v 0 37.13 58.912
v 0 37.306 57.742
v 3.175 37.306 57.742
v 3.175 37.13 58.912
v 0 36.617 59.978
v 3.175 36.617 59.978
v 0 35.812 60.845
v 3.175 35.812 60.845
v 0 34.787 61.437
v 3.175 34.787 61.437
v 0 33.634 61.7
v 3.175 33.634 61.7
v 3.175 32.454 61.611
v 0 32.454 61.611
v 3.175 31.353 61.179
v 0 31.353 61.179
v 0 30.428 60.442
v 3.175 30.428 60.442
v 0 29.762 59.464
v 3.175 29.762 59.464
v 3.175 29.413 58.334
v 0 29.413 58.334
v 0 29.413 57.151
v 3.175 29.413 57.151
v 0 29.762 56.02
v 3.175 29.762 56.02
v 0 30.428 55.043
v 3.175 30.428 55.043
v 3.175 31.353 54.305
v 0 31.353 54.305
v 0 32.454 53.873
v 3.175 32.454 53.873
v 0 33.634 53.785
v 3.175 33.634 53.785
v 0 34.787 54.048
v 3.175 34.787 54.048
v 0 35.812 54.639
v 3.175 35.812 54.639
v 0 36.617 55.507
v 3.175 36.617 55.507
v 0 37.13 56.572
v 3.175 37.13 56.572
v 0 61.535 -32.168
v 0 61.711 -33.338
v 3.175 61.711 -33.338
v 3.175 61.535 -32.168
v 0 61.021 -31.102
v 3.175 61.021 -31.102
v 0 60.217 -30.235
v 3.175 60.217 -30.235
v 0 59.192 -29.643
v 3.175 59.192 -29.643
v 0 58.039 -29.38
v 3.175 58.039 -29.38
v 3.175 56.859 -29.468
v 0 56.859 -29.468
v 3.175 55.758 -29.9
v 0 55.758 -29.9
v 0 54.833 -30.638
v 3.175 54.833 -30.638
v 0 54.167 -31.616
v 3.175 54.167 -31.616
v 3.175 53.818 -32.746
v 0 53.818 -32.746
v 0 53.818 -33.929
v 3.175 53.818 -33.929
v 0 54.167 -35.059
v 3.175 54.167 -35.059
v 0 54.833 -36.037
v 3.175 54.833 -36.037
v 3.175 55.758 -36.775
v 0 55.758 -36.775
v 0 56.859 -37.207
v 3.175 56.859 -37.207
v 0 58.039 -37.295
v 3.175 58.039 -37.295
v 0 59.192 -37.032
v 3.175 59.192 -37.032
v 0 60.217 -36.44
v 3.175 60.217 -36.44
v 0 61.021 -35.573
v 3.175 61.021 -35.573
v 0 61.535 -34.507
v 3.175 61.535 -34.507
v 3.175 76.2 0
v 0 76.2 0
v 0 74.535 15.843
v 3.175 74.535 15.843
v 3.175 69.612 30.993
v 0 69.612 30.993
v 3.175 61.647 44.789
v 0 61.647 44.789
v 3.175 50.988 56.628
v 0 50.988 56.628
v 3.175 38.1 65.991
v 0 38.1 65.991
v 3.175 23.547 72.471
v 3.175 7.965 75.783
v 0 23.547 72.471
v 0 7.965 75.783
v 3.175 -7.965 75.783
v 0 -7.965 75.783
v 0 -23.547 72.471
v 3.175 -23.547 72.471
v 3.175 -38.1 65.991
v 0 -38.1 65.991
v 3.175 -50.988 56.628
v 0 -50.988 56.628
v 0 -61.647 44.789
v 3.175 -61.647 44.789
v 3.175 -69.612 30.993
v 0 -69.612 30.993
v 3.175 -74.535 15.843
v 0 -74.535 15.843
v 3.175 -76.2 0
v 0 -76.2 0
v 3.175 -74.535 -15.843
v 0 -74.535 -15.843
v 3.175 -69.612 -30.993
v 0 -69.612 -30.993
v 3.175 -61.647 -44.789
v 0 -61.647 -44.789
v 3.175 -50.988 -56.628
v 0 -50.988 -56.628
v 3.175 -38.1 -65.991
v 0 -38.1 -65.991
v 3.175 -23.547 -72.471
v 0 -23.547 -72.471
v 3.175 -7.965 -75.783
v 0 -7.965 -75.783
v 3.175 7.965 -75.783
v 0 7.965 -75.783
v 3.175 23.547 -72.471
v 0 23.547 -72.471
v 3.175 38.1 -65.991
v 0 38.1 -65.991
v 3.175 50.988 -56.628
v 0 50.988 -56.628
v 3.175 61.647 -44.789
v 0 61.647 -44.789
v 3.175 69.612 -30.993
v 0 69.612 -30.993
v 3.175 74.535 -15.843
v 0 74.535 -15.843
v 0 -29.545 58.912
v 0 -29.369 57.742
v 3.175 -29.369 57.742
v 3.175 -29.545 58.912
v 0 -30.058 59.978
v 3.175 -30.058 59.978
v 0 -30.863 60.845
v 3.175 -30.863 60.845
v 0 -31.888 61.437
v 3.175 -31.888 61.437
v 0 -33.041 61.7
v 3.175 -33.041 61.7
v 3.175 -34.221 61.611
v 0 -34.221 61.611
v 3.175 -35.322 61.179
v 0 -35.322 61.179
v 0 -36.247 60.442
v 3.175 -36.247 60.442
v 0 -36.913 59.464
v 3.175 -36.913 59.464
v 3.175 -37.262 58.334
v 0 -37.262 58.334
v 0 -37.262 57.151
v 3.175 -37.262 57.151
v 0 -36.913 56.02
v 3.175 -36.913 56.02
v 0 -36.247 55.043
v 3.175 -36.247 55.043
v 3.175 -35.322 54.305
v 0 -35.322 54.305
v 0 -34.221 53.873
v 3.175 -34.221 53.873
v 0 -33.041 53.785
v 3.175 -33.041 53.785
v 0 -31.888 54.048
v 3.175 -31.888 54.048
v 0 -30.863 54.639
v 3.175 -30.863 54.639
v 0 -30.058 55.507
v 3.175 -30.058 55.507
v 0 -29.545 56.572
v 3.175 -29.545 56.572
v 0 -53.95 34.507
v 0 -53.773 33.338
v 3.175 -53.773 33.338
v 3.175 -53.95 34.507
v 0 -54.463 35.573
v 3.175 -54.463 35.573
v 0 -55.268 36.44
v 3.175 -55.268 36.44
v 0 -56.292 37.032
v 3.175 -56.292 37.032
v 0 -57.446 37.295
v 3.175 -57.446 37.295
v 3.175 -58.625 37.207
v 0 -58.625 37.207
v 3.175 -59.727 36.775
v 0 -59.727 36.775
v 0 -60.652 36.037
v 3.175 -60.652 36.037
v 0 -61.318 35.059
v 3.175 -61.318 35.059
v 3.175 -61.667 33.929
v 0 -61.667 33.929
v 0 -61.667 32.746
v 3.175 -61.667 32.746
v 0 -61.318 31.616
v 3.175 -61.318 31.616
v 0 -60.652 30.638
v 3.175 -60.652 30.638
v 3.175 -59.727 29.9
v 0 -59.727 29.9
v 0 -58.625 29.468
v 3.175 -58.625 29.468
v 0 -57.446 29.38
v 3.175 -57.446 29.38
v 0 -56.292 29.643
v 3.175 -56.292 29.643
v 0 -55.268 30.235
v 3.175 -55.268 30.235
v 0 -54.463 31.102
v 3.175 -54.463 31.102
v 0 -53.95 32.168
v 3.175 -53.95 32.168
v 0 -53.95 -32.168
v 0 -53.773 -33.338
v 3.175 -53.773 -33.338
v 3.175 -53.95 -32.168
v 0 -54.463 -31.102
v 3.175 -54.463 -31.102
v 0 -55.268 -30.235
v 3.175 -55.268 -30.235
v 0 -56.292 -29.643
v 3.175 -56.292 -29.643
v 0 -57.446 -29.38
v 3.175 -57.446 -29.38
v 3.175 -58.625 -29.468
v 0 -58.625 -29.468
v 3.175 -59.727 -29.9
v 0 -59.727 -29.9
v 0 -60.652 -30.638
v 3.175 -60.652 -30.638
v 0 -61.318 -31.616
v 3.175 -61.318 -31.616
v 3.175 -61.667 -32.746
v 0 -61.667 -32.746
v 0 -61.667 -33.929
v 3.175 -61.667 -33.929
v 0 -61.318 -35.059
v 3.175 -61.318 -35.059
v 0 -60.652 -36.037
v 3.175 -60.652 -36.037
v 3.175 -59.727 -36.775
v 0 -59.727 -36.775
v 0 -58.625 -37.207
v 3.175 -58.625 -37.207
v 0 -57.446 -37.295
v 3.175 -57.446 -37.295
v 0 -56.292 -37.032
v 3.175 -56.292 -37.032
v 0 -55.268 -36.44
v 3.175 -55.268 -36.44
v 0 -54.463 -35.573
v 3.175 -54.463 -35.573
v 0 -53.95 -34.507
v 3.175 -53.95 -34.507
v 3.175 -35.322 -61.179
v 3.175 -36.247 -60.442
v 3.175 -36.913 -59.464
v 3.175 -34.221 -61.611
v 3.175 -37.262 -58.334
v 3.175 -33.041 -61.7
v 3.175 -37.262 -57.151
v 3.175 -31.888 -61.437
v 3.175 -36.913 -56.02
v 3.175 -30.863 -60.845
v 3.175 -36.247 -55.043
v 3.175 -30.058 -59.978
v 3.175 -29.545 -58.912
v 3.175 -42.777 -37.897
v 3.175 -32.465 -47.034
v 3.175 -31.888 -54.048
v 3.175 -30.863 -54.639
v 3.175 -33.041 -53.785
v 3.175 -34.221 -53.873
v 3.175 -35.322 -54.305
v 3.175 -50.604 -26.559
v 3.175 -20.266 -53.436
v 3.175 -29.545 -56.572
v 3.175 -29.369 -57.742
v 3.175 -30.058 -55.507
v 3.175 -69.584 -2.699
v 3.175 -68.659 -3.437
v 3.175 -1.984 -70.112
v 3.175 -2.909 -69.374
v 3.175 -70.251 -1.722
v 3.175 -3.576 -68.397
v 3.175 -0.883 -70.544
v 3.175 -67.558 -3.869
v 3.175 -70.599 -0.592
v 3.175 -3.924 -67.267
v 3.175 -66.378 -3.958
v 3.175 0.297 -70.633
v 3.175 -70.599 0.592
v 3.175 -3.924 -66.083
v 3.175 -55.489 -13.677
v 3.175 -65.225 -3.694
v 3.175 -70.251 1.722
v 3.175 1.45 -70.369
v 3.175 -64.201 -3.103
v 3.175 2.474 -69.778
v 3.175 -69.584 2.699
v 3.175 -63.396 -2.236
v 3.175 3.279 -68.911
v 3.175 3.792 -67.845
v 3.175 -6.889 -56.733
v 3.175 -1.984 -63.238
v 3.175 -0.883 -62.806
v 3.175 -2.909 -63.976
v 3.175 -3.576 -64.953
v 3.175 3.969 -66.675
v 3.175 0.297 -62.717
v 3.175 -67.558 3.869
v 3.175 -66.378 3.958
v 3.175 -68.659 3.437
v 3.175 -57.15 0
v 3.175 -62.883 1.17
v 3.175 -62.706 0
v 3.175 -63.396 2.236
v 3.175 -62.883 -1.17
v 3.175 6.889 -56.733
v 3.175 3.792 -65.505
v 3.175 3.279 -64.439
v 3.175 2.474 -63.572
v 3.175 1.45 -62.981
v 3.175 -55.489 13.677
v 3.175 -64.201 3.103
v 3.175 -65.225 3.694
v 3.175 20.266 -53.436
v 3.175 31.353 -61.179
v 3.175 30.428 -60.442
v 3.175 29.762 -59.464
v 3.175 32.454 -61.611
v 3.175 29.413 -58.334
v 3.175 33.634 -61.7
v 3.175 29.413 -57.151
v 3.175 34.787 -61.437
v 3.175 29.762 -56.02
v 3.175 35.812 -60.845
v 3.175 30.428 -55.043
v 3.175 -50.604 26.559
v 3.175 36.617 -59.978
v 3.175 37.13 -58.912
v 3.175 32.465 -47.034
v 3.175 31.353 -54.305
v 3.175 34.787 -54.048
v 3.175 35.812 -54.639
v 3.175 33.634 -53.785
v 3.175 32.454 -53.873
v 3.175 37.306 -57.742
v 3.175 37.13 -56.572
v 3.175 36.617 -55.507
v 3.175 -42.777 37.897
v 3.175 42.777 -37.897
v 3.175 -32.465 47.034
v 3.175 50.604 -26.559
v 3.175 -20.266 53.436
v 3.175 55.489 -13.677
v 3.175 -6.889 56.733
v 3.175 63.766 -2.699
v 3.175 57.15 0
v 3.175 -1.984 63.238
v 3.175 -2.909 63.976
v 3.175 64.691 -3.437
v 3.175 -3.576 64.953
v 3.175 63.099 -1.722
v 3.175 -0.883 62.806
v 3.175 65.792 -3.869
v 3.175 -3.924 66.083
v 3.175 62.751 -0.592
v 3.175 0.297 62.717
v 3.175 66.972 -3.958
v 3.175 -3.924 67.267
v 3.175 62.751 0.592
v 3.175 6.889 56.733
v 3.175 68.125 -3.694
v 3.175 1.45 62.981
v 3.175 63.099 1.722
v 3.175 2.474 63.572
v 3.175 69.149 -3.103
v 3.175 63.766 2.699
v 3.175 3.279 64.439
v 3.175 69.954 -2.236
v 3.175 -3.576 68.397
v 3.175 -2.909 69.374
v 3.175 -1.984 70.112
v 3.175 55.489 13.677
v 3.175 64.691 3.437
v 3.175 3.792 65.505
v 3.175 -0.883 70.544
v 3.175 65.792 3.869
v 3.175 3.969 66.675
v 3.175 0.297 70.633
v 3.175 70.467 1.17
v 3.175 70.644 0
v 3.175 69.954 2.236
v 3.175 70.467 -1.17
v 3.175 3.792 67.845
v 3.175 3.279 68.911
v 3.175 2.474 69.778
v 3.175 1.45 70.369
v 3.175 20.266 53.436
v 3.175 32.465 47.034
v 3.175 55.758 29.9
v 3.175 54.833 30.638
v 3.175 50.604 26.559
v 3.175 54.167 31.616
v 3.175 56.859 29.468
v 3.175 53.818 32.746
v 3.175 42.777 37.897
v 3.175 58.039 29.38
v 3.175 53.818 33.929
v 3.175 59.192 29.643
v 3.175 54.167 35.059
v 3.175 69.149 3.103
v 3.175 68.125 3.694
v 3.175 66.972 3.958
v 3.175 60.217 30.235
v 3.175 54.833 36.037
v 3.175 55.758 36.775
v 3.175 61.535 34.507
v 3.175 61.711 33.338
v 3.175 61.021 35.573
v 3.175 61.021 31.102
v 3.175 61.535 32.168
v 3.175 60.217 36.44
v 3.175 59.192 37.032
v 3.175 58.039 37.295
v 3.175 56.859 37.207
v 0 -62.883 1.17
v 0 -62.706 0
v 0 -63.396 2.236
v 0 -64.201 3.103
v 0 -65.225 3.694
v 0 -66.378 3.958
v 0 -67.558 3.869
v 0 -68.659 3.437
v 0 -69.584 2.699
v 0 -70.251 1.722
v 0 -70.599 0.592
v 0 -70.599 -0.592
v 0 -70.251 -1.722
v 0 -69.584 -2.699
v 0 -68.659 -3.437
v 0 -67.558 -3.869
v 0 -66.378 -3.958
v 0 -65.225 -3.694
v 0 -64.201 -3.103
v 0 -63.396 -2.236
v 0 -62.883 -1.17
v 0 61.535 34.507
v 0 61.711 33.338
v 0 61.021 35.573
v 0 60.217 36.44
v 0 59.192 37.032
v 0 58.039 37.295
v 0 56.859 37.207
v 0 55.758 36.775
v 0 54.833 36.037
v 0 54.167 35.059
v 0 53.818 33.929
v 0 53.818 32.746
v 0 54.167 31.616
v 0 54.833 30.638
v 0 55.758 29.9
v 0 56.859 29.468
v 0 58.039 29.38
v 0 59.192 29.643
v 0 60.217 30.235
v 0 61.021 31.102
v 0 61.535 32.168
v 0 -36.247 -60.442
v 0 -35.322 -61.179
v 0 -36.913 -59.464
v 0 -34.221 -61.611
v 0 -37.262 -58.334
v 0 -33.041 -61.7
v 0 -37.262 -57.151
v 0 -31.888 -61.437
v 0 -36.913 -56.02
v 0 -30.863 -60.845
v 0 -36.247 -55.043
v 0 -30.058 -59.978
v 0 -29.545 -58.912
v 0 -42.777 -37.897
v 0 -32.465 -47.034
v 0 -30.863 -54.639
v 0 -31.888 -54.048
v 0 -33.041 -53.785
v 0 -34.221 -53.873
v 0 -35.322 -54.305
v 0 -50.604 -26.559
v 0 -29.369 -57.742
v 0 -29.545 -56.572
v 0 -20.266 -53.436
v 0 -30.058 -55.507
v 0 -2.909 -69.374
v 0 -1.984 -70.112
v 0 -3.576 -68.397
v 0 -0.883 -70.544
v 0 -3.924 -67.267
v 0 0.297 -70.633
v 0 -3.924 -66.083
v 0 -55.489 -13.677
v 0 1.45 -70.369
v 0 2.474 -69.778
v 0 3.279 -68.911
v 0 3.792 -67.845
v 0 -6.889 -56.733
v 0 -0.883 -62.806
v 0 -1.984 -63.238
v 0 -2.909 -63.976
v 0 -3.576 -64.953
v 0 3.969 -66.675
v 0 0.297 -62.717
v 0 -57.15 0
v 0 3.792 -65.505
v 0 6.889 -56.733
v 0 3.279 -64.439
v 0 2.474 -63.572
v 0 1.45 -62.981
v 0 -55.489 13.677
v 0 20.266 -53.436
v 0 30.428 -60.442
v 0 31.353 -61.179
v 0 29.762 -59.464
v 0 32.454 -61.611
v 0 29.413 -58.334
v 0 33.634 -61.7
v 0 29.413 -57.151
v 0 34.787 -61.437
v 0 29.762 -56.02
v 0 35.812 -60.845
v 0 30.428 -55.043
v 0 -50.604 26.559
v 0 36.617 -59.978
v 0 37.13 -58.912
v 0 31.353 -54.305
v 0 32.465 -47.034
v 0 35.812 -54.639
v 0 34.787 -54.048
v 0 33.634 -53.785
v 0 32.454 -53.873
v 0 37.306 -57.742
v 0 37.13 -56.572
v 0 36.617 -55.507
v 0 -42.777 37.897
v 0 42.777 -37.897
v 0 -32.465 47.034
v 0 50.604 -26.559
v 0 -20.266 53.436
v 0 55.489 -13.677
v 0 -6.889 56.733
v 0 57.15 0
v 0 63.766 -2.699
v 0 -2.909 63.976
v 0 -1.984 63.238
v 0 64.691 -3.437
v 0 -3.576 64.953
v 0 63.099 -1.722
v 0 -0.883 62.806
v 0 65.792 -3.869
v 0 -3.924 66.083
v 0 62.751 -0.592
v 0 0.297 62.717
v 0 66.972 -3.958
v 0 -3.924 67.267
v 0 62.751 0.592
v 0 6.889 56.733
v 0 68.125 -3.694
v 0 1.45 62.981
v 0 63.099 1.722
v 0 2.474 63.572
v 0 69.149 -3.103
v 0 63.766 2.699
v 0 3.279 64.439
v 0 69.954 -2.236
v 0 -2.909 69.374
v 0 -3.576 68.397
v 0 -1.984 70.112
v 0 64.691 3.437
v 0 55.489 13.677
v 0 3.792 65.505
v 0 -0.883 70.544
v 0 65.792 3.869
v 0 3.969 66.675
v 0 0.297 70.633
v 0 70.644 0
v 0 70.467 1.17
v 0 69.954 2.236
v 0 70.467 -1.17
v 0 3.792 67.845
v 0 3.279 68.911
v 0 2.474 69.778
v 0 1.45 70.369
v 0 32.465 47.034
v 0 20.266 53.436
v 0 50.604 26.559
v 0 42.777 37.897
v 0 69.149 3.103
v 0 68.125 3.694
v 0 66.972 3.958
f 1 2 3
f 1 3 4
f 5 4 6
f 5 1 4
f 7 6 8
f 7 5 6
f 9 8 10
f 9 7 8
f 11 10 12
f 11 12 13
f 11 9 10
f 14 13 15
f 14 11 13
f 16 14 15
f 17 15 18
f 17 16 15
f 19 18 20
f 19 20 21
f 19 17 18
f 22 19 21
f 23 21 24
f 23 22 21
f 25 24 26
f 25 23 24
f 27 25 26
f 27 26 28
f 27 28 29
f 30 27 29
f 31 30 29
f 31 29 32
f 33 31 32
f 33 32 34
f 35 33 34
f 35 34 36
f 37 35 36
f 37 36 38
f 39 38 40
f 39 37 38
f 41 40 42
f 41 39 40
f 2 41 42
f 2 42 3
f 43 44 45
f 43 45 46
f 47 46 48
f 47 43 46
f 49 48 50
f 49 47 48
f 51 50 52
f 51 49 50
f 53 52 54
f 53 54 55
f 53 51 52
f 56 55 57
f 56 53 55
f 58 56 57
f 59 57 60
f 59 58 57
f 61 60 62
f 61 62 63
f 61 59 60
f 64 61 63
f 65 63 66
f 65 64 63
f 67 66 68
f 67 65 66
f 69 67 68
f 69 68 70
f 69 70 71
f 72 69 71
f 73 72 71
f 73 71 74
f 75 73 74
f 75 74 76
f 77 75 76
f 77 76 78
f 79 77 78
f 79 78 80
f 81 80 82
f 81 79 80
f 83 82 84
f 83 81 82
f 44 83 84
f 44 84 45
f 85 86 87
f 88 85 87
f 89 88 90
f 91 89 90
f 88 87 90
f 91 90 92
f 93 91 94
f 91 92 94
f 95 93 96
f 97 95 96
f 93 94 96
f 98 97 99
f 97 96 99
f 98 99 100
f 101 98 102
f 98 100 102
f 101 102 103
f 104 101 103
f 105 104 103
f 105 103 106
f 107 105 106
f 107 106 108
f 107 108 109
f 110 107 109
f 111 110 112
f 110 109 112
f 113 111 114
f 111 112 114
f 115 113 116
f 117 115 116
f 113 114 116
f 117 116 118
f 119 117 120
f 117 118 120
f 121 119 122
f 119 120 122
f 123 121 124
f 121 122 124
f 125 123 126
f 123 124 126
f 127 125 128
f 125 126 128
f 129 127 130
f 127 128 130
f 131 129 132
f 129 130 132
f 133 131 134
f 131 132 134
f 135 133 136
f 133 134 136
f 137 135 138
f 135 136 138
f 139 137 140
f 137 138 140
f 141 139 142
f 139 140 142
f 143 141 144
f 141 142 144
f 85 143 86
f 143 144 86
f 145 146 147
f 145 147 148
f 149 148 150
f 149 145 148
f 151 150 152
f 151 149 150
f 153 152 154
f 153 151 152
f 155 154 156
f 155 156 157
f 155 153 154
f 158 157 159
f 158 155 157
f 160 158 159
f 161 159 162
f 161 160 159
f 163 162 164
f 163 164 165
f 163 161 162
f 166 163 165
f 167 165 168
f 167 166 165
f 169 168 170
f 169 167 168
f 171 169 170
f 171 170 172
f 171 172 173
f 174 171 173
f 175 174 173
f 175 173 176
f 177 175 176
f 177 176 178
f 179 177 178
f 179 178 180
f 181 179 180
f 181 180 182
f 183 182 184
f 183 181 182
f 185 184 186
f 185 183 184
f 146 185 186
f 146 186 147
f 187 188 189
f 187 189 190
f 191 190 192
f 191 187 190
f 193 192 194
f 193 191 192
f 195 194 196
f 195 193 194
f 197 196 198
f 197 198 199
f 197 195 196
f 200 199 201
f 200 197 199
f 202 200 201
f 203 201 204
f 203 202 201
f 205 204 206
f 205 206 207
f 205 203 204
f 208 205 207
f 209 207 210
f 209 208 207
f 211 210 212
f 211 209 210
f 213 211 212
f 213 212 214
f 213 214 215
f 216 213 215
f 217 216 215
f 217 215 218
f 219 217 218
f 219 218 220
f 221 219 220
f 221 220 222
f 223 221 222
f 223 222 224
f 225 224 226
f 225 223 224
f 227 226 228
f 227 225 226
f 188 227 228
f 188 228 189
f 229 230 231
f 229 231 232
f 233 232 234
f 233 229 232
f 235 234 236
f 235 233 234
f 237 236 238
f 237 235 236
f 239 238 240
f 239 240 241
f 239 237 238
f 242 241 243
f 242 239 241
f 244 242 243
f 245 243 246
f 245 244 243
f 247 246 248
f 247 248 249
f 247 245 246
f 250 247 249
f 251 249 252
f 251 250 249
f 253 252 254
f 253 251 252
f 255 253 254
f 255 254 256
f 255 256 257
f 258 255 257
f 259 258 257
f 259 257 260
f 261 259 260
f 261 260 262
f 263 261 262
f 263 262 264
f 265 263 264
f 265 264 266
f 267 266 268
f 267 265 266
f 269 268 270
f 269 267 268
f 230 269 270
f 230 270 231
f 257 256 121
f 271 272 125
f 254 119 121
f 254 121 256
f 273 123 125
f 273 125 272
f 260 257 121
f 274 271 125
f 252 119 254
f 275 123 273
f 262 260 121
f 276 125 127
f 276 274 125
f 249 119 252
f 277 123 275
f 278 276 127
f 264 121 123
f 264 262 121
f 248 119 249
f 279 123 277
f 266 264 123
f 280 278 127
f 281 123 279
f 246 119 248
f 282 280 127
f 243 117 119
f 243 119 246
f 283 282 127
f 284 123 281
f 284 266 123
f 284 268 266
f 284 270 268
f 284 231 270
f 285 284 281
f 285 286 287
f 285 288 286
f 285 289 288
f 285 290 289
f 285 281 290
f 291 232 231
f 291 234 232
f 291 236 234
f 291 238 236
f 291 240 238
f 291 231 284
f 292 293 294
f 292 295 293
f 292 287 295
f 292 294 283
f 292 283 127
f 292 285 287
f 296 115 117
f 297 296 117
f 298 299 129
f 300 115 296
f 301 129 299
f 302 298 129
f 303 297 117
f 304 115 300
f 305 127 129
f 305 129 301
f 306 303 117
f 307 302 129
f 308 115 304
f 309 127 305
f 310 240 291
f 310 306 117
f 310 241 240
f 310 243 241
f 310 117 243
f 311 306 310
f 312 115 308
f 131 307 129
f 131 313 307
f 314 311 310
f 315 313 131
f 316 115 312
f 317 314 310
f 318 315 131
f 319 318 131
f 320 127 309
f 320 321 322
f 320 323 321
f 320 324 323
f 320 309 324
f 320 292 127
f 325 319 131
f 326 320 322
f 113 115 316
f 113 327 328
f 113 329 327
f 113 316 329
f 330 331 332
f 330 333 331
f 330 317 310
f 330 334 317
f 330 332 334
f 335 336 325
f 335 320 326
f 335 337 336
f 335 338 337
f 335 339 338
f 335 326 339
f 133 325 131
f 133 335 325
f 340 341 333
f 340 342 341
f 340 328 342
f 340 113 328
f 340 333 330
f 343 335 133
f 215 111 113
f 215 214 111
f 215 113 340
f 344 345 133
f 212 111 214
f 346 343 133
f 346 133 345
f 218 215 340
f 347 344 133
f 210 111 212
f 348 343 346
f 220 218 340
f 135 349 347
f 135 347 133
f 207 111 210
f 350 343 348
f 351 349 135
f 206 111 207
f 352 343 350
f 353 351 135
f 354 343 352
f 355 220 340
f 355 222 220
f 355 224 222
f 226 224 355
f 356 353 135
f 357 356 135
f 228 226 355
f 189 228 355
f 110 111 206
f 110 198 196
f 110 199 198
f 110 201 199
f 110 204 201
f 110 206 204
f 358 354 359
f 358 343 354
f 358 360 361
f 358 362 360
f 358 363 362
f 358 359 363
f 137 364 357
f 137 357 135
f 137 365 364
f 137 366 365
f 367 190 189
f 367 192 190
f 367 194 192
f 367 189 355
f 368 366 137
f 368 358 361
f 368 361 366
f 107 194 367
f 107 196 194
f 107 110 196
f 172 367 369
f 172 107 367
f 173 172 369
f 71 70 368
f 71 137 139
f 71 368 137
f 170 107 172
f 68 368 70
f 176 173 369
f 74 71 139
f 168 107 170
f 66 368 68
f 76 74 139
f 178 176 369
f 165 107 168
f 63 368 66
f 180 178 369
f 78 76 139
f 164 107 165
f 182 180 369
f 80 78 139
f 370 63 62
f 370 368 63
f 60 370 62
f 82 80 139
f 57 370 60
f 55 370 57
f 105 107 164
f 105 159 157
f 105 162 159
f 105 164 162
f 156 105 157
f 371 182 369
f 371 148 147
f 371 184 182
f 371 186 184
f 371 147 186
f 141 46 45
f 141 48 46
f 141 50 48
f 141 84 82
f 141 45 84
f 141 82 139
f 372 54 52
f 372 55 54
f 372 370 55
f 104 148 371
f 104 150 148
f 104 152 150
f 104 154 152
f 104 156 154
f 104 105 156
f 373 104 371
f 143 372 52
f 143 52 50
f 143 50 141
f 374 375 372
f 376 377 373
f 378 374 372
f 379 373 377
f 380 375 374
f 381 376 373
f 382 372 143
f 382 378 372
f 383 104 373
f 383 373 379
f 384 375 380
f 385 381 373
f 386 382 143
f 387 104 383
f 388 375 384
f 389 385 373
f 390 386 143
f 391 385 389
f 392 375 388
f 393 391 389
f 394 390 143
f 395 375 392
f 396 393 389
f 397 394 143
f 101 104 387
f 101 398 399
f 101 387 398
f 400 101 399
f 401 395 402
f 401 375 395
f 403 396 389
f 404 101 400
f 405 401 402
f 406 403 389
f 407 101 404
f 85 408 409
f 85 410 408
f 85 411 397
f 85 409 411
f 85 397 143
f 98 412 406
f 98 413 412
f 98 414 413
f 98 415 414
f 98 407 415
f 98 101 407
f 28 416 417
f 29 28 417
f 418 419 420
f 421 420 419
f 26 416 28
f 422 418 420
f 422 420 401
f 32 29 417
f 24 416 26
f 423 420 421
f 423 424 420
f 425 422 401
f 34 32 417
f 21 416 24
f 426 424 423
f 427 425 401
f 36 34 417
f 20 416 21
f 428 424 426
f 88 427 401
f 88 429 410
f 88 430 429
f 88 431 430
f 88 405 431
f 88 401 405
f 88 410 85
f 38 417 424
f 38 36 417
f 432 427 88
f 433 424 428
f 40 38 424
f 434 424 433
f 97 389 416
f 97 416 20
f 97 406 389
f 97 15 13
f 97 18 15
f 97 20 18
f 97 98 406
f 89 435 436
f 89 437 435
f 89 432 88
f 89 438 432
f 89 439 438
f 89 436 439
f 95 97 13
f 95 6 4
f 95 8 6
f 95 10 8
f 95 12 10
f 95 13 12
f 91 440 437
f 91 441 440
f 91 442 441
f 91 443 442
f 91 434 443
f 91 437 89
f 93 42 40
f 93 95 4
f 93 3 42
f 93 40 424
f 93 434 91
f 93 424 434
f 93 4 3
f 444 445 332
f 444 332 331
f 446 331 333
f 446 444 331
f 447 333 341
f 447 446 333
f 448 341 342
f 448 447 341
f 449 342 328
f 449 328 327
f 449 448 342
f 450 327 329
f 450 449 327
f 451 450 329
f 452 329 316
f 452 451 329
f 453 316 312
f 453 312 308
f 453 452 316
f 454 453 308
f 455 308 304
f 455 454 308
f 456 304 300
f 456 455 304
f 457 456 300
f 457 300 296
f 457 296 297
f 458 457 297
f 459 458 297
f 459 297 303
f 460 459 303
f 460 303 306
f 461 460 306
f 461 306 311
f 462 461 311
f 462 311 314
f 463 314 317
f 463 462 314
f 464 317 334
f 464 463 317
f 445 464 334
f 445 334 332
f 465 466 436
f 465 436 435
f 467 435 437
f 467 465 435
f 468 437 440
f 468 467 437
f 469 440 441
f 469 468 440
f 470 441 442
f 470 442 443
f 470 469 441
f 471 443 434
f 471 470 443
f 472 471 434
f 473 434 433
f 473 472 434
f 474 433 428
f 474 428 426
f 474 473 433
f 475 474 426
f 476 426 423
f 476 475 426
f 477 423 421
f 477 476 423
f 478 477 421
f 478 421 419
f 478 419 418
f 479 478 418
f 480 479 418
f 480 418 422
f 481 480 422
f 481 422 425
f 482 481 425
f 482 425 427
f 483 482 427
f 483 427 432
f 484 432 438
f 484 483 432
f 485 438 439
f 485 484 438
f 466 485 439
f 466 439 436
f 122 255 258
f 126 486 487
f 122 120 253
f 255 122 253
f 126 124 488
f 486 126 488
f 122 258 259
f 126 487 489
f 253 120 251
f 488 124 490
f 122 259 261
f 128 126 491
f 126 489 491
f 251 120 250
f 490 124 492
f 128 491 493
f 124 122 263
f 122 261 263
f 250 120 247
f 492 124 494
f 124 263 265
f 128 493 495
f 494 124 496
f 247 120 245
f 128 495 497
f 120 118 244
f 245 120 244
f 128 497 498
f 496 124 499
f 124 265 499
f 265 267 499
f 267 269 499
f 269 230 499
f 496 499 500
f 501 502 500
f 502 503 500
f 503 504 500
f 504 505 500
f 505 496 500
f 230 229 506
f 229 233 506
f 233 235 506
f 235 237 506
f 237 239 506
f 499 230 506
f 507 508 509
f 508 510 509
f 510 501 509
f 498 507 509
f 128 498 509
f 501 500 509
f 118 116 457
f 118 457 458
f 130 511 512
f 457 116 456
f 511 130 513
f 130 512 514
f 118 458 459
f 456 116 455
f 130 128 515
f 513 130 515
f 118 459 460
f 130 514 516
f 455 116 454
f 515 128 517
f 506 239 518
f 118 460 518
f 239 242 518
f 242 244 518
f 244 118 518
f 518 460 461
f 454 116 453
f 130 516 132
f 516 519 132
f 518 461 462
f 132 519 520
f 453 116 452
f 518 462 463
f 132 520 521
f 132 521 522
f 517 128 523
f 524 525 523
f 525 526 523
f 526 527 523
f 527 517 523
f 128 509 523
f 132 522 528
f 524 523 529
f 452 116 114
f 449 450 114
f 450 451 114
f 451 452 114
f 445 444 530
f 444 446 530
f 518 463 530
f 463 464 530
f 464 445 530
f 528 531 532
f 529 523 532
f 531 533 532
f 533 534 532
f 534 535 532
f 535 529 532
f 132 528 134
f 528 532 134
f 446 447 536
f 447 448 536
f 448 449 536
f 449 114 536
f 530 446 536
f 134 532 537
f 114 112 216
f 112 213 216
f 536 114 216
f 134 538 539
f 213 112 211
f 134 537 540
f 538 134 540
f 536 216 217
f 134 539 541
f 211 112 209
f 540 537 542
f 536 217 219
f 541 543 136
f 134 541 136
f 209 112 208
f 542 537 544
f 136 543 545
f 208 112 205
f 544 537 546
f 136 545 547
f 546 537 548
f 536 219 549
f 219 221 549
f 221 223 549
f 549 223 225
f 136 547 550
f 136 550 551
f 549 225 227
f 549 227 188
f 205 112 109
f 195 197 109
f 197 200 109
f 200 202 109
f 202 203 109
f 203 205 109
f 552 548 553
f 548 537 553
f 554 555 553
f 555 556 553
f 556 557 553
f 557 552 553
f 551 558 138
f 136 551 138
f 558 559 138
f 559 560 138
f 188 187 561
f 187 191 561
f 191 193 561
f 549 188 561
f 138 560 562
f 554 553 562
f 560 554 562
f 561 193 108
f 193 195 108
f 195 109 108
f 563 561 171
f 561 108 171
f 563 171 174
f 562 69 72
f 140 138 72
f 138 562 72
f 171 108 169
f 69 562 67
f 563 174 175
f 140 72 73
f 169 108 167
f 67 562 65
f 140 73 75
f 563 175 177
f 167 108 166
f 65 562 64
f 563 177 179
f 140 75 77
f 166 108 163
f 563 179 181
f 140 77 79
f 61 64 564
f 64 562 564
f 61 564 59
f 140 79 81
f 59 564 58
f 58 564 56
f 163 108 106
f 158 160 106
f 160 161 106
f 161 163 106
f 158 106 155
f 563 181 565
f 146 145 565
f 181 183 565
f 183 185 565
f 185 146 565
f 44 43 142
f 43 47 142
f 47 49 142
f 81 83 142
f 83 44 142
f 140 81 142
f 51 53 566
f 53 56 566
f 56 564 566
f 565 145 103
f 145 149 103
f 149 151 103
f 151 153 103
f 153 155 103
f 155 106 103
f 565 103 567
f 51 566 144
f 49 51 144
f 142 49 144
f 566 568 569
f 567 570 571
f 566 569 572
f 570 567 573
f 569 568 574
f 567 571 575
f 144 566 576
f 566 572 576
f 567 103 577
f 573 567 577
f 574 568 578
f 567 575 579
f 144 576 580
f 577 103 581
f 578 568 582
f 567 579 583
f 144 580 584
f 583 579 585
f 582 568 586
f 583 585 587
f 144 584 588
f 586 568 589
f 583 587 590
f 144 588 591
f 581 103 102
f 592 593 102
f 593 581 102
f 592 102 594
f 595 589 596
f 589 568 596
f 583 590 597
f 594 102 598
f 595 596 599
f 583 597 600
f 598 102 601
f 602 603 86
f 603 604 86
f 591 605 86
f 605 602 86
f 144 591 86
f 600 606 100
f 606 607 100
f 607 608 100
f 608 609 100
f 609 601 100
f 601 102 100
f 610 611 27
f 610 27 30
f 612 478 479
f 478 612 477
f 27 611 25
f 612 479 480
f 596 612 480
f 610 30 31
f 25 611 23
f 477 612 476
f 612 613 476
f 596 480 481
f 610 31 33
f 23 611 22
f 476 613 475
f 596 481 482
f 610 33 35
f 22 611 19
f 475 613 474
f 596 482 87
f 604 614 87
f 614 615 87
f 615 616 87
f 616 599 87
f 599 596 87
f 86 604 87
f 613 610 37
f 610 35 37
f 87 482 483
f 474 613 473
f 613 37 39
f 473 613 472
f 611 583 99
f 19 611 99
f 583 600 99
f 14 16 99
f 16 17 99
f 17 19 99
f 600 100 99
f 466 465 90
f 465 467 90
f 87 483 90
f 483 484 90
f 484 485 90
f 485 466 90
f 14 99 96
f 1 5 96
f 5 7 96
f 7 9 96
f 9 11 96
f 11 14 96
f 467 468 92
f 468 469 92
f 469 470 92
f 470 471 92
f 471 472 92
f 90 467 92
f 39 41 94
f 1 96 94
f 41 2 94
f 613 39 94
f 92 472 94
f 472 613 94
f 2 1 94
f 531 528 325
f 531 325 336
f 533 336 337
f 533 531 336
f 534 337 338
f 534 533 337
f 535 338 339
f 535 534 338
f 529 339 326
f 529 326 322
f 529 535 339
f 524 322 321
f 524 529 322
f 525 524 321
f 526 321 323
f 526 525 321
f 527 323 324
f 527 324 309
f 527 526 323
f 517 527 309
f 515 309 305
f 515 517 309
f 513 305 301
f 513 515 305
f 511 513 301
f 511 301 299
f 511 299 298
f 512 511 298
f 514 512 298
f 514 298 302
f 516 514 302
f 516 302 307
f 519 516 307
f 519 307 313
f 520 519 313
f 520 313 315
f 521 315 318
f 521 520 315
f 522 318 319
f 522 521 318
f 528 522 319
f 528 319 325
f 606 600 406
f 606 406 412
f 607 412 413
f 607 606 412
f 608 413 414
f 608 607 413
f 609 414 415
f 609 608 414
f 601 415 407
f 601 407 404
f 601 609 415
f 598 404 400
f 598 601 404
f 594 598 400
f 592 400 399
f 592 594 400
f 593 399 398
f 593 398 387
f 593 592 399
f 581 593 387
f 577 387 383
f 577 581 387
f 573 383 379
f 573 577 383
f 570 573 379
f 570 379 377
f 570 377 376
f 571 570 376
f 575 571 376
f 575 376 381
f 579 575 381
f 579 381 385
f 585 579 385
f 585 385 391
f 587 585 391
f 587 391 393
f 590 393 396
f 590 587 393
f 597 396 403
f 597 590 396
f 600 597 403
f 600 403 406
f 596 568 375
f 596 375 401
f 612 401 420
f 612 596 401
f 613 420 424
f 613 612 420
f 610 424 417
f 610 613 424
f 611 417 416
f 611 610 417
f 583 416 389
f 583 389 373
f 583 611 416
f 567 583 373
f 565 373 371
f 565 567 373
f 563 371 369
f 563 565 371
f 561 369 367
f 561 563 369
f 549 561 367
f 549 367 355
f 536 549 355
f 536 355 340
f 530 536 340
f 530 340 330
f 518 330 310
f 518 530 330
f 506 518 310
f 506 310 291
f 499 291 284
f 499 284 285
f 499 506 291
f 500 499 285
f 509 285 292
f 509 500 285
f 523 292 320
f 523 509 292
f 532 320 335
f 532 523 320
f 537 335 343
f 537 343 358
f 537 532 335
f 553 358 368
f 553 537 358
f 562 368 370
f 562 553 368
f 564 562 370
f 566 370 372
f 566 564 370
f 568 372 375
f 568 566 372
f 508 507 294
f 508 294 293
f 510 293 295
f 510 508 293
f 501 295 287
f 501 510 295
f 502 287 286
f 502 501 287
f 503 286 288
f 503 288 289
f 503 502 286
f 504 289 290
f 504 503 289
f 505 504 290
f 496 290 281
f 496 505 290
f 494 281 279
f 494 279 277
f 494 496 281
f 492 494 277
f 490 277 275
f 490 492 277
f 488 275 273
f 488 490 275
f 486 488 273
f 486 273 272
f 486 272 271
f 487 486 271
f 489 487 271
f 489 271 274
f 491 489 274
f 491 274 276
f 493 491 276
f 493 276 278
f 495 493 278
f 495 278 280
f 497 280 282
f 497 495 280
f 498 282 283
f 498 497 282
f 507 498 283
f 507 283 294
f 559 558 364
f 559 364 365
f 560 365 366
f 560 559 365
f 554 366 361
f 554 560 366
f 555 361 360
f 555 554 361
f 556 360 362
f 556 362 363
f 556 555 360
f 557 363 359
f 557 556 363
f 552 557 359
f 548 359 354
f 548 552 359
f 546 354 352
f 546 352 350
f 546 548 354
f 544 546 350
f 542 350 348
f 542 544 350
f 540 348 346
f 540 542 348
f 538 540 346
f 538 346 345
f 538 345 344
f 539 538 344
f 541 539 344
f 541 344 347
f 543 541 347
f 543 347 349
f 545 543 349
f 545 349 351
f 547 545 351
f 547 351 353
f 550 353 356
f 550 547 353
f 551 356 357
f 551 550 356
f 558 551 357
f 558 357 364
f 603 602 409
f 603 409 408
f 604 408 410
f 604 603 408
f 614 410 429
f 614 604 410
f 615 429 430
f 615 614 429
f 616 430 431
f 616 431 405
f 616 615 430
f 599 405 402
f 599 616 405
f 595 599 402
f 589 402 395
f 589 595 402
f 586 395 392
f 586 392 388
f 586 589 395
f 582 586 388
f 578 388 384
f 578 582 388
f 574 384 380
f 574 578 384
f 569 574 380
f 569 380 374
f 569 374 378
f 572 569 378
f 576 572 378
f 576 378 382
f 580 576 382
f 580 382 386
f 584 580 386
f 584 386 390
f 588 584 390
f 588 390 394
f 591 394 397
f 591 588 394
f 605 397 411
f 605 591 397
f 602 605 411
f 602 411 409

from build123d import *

# Parameters (mm, degrees)
F0_R     = 76.2
F0_R_2   = 3.96875
F0_R_3   = 57.15
F1_DEPTH = 3.175


with BuildPart() as f1:
    # F0 (on Right) → F1 (new body)
    with BuildSketch(Plane.YZ):
        Circle(F0_R)
        with Locations((-33.3375, -57.742244)):
            Circle(F0_R_2, mode=Mode.SUBTRACT)
        with Locations((-57.742244, -33.3375)):
            Circle(F0_R_2, mode=Mode.SUBTRACT)
        with Locations((0, -66.675)):
            Circle(F0_R_2, mode=Mode.SUBTRACT)
        with Locations((33.3375, -57.742244)):
            Circle(F0_R_2, mode=Mode.SUBTRACT)
        with Locations((57.742244, -33.3375)):
            Circle(F0_R_2, mode=Mode.SUBTRACT)
        with Locations((-66.675, 0)):
            Circle(F0_R_2, mode=Mode.SUBTRACT)
        with Locations((-57.742244, 33.3375)):
            Circle(F0_R_2, mode=Mode.SUBTRACT)
        with Locations((-33.3375, 57.742244)):
            Circle(F0_R_2, mode=Mode.SUBTRACT)
        Circle(F0_R_3, mode=Mode.SUBTRACT)
        with Locations((66.675, 0)):
            Circle(F0_R_2, mode=Mode.SUBTRACT)
        with Locations((57.742244, 33.3375)):
            Circle(F0_R_2, mode=Mode.SUBTRACT)
        with Locations((0, 66.675)):
            Circle(F0_R_2, mode=Mode.SUBTRACT)
        with Locations((33.3375, 57.742244)):
            Circle(F0_R_2, mode=Mode.SUBTRACT)
    extrude(amount=F1_DEPTH)


solid = f1.part
